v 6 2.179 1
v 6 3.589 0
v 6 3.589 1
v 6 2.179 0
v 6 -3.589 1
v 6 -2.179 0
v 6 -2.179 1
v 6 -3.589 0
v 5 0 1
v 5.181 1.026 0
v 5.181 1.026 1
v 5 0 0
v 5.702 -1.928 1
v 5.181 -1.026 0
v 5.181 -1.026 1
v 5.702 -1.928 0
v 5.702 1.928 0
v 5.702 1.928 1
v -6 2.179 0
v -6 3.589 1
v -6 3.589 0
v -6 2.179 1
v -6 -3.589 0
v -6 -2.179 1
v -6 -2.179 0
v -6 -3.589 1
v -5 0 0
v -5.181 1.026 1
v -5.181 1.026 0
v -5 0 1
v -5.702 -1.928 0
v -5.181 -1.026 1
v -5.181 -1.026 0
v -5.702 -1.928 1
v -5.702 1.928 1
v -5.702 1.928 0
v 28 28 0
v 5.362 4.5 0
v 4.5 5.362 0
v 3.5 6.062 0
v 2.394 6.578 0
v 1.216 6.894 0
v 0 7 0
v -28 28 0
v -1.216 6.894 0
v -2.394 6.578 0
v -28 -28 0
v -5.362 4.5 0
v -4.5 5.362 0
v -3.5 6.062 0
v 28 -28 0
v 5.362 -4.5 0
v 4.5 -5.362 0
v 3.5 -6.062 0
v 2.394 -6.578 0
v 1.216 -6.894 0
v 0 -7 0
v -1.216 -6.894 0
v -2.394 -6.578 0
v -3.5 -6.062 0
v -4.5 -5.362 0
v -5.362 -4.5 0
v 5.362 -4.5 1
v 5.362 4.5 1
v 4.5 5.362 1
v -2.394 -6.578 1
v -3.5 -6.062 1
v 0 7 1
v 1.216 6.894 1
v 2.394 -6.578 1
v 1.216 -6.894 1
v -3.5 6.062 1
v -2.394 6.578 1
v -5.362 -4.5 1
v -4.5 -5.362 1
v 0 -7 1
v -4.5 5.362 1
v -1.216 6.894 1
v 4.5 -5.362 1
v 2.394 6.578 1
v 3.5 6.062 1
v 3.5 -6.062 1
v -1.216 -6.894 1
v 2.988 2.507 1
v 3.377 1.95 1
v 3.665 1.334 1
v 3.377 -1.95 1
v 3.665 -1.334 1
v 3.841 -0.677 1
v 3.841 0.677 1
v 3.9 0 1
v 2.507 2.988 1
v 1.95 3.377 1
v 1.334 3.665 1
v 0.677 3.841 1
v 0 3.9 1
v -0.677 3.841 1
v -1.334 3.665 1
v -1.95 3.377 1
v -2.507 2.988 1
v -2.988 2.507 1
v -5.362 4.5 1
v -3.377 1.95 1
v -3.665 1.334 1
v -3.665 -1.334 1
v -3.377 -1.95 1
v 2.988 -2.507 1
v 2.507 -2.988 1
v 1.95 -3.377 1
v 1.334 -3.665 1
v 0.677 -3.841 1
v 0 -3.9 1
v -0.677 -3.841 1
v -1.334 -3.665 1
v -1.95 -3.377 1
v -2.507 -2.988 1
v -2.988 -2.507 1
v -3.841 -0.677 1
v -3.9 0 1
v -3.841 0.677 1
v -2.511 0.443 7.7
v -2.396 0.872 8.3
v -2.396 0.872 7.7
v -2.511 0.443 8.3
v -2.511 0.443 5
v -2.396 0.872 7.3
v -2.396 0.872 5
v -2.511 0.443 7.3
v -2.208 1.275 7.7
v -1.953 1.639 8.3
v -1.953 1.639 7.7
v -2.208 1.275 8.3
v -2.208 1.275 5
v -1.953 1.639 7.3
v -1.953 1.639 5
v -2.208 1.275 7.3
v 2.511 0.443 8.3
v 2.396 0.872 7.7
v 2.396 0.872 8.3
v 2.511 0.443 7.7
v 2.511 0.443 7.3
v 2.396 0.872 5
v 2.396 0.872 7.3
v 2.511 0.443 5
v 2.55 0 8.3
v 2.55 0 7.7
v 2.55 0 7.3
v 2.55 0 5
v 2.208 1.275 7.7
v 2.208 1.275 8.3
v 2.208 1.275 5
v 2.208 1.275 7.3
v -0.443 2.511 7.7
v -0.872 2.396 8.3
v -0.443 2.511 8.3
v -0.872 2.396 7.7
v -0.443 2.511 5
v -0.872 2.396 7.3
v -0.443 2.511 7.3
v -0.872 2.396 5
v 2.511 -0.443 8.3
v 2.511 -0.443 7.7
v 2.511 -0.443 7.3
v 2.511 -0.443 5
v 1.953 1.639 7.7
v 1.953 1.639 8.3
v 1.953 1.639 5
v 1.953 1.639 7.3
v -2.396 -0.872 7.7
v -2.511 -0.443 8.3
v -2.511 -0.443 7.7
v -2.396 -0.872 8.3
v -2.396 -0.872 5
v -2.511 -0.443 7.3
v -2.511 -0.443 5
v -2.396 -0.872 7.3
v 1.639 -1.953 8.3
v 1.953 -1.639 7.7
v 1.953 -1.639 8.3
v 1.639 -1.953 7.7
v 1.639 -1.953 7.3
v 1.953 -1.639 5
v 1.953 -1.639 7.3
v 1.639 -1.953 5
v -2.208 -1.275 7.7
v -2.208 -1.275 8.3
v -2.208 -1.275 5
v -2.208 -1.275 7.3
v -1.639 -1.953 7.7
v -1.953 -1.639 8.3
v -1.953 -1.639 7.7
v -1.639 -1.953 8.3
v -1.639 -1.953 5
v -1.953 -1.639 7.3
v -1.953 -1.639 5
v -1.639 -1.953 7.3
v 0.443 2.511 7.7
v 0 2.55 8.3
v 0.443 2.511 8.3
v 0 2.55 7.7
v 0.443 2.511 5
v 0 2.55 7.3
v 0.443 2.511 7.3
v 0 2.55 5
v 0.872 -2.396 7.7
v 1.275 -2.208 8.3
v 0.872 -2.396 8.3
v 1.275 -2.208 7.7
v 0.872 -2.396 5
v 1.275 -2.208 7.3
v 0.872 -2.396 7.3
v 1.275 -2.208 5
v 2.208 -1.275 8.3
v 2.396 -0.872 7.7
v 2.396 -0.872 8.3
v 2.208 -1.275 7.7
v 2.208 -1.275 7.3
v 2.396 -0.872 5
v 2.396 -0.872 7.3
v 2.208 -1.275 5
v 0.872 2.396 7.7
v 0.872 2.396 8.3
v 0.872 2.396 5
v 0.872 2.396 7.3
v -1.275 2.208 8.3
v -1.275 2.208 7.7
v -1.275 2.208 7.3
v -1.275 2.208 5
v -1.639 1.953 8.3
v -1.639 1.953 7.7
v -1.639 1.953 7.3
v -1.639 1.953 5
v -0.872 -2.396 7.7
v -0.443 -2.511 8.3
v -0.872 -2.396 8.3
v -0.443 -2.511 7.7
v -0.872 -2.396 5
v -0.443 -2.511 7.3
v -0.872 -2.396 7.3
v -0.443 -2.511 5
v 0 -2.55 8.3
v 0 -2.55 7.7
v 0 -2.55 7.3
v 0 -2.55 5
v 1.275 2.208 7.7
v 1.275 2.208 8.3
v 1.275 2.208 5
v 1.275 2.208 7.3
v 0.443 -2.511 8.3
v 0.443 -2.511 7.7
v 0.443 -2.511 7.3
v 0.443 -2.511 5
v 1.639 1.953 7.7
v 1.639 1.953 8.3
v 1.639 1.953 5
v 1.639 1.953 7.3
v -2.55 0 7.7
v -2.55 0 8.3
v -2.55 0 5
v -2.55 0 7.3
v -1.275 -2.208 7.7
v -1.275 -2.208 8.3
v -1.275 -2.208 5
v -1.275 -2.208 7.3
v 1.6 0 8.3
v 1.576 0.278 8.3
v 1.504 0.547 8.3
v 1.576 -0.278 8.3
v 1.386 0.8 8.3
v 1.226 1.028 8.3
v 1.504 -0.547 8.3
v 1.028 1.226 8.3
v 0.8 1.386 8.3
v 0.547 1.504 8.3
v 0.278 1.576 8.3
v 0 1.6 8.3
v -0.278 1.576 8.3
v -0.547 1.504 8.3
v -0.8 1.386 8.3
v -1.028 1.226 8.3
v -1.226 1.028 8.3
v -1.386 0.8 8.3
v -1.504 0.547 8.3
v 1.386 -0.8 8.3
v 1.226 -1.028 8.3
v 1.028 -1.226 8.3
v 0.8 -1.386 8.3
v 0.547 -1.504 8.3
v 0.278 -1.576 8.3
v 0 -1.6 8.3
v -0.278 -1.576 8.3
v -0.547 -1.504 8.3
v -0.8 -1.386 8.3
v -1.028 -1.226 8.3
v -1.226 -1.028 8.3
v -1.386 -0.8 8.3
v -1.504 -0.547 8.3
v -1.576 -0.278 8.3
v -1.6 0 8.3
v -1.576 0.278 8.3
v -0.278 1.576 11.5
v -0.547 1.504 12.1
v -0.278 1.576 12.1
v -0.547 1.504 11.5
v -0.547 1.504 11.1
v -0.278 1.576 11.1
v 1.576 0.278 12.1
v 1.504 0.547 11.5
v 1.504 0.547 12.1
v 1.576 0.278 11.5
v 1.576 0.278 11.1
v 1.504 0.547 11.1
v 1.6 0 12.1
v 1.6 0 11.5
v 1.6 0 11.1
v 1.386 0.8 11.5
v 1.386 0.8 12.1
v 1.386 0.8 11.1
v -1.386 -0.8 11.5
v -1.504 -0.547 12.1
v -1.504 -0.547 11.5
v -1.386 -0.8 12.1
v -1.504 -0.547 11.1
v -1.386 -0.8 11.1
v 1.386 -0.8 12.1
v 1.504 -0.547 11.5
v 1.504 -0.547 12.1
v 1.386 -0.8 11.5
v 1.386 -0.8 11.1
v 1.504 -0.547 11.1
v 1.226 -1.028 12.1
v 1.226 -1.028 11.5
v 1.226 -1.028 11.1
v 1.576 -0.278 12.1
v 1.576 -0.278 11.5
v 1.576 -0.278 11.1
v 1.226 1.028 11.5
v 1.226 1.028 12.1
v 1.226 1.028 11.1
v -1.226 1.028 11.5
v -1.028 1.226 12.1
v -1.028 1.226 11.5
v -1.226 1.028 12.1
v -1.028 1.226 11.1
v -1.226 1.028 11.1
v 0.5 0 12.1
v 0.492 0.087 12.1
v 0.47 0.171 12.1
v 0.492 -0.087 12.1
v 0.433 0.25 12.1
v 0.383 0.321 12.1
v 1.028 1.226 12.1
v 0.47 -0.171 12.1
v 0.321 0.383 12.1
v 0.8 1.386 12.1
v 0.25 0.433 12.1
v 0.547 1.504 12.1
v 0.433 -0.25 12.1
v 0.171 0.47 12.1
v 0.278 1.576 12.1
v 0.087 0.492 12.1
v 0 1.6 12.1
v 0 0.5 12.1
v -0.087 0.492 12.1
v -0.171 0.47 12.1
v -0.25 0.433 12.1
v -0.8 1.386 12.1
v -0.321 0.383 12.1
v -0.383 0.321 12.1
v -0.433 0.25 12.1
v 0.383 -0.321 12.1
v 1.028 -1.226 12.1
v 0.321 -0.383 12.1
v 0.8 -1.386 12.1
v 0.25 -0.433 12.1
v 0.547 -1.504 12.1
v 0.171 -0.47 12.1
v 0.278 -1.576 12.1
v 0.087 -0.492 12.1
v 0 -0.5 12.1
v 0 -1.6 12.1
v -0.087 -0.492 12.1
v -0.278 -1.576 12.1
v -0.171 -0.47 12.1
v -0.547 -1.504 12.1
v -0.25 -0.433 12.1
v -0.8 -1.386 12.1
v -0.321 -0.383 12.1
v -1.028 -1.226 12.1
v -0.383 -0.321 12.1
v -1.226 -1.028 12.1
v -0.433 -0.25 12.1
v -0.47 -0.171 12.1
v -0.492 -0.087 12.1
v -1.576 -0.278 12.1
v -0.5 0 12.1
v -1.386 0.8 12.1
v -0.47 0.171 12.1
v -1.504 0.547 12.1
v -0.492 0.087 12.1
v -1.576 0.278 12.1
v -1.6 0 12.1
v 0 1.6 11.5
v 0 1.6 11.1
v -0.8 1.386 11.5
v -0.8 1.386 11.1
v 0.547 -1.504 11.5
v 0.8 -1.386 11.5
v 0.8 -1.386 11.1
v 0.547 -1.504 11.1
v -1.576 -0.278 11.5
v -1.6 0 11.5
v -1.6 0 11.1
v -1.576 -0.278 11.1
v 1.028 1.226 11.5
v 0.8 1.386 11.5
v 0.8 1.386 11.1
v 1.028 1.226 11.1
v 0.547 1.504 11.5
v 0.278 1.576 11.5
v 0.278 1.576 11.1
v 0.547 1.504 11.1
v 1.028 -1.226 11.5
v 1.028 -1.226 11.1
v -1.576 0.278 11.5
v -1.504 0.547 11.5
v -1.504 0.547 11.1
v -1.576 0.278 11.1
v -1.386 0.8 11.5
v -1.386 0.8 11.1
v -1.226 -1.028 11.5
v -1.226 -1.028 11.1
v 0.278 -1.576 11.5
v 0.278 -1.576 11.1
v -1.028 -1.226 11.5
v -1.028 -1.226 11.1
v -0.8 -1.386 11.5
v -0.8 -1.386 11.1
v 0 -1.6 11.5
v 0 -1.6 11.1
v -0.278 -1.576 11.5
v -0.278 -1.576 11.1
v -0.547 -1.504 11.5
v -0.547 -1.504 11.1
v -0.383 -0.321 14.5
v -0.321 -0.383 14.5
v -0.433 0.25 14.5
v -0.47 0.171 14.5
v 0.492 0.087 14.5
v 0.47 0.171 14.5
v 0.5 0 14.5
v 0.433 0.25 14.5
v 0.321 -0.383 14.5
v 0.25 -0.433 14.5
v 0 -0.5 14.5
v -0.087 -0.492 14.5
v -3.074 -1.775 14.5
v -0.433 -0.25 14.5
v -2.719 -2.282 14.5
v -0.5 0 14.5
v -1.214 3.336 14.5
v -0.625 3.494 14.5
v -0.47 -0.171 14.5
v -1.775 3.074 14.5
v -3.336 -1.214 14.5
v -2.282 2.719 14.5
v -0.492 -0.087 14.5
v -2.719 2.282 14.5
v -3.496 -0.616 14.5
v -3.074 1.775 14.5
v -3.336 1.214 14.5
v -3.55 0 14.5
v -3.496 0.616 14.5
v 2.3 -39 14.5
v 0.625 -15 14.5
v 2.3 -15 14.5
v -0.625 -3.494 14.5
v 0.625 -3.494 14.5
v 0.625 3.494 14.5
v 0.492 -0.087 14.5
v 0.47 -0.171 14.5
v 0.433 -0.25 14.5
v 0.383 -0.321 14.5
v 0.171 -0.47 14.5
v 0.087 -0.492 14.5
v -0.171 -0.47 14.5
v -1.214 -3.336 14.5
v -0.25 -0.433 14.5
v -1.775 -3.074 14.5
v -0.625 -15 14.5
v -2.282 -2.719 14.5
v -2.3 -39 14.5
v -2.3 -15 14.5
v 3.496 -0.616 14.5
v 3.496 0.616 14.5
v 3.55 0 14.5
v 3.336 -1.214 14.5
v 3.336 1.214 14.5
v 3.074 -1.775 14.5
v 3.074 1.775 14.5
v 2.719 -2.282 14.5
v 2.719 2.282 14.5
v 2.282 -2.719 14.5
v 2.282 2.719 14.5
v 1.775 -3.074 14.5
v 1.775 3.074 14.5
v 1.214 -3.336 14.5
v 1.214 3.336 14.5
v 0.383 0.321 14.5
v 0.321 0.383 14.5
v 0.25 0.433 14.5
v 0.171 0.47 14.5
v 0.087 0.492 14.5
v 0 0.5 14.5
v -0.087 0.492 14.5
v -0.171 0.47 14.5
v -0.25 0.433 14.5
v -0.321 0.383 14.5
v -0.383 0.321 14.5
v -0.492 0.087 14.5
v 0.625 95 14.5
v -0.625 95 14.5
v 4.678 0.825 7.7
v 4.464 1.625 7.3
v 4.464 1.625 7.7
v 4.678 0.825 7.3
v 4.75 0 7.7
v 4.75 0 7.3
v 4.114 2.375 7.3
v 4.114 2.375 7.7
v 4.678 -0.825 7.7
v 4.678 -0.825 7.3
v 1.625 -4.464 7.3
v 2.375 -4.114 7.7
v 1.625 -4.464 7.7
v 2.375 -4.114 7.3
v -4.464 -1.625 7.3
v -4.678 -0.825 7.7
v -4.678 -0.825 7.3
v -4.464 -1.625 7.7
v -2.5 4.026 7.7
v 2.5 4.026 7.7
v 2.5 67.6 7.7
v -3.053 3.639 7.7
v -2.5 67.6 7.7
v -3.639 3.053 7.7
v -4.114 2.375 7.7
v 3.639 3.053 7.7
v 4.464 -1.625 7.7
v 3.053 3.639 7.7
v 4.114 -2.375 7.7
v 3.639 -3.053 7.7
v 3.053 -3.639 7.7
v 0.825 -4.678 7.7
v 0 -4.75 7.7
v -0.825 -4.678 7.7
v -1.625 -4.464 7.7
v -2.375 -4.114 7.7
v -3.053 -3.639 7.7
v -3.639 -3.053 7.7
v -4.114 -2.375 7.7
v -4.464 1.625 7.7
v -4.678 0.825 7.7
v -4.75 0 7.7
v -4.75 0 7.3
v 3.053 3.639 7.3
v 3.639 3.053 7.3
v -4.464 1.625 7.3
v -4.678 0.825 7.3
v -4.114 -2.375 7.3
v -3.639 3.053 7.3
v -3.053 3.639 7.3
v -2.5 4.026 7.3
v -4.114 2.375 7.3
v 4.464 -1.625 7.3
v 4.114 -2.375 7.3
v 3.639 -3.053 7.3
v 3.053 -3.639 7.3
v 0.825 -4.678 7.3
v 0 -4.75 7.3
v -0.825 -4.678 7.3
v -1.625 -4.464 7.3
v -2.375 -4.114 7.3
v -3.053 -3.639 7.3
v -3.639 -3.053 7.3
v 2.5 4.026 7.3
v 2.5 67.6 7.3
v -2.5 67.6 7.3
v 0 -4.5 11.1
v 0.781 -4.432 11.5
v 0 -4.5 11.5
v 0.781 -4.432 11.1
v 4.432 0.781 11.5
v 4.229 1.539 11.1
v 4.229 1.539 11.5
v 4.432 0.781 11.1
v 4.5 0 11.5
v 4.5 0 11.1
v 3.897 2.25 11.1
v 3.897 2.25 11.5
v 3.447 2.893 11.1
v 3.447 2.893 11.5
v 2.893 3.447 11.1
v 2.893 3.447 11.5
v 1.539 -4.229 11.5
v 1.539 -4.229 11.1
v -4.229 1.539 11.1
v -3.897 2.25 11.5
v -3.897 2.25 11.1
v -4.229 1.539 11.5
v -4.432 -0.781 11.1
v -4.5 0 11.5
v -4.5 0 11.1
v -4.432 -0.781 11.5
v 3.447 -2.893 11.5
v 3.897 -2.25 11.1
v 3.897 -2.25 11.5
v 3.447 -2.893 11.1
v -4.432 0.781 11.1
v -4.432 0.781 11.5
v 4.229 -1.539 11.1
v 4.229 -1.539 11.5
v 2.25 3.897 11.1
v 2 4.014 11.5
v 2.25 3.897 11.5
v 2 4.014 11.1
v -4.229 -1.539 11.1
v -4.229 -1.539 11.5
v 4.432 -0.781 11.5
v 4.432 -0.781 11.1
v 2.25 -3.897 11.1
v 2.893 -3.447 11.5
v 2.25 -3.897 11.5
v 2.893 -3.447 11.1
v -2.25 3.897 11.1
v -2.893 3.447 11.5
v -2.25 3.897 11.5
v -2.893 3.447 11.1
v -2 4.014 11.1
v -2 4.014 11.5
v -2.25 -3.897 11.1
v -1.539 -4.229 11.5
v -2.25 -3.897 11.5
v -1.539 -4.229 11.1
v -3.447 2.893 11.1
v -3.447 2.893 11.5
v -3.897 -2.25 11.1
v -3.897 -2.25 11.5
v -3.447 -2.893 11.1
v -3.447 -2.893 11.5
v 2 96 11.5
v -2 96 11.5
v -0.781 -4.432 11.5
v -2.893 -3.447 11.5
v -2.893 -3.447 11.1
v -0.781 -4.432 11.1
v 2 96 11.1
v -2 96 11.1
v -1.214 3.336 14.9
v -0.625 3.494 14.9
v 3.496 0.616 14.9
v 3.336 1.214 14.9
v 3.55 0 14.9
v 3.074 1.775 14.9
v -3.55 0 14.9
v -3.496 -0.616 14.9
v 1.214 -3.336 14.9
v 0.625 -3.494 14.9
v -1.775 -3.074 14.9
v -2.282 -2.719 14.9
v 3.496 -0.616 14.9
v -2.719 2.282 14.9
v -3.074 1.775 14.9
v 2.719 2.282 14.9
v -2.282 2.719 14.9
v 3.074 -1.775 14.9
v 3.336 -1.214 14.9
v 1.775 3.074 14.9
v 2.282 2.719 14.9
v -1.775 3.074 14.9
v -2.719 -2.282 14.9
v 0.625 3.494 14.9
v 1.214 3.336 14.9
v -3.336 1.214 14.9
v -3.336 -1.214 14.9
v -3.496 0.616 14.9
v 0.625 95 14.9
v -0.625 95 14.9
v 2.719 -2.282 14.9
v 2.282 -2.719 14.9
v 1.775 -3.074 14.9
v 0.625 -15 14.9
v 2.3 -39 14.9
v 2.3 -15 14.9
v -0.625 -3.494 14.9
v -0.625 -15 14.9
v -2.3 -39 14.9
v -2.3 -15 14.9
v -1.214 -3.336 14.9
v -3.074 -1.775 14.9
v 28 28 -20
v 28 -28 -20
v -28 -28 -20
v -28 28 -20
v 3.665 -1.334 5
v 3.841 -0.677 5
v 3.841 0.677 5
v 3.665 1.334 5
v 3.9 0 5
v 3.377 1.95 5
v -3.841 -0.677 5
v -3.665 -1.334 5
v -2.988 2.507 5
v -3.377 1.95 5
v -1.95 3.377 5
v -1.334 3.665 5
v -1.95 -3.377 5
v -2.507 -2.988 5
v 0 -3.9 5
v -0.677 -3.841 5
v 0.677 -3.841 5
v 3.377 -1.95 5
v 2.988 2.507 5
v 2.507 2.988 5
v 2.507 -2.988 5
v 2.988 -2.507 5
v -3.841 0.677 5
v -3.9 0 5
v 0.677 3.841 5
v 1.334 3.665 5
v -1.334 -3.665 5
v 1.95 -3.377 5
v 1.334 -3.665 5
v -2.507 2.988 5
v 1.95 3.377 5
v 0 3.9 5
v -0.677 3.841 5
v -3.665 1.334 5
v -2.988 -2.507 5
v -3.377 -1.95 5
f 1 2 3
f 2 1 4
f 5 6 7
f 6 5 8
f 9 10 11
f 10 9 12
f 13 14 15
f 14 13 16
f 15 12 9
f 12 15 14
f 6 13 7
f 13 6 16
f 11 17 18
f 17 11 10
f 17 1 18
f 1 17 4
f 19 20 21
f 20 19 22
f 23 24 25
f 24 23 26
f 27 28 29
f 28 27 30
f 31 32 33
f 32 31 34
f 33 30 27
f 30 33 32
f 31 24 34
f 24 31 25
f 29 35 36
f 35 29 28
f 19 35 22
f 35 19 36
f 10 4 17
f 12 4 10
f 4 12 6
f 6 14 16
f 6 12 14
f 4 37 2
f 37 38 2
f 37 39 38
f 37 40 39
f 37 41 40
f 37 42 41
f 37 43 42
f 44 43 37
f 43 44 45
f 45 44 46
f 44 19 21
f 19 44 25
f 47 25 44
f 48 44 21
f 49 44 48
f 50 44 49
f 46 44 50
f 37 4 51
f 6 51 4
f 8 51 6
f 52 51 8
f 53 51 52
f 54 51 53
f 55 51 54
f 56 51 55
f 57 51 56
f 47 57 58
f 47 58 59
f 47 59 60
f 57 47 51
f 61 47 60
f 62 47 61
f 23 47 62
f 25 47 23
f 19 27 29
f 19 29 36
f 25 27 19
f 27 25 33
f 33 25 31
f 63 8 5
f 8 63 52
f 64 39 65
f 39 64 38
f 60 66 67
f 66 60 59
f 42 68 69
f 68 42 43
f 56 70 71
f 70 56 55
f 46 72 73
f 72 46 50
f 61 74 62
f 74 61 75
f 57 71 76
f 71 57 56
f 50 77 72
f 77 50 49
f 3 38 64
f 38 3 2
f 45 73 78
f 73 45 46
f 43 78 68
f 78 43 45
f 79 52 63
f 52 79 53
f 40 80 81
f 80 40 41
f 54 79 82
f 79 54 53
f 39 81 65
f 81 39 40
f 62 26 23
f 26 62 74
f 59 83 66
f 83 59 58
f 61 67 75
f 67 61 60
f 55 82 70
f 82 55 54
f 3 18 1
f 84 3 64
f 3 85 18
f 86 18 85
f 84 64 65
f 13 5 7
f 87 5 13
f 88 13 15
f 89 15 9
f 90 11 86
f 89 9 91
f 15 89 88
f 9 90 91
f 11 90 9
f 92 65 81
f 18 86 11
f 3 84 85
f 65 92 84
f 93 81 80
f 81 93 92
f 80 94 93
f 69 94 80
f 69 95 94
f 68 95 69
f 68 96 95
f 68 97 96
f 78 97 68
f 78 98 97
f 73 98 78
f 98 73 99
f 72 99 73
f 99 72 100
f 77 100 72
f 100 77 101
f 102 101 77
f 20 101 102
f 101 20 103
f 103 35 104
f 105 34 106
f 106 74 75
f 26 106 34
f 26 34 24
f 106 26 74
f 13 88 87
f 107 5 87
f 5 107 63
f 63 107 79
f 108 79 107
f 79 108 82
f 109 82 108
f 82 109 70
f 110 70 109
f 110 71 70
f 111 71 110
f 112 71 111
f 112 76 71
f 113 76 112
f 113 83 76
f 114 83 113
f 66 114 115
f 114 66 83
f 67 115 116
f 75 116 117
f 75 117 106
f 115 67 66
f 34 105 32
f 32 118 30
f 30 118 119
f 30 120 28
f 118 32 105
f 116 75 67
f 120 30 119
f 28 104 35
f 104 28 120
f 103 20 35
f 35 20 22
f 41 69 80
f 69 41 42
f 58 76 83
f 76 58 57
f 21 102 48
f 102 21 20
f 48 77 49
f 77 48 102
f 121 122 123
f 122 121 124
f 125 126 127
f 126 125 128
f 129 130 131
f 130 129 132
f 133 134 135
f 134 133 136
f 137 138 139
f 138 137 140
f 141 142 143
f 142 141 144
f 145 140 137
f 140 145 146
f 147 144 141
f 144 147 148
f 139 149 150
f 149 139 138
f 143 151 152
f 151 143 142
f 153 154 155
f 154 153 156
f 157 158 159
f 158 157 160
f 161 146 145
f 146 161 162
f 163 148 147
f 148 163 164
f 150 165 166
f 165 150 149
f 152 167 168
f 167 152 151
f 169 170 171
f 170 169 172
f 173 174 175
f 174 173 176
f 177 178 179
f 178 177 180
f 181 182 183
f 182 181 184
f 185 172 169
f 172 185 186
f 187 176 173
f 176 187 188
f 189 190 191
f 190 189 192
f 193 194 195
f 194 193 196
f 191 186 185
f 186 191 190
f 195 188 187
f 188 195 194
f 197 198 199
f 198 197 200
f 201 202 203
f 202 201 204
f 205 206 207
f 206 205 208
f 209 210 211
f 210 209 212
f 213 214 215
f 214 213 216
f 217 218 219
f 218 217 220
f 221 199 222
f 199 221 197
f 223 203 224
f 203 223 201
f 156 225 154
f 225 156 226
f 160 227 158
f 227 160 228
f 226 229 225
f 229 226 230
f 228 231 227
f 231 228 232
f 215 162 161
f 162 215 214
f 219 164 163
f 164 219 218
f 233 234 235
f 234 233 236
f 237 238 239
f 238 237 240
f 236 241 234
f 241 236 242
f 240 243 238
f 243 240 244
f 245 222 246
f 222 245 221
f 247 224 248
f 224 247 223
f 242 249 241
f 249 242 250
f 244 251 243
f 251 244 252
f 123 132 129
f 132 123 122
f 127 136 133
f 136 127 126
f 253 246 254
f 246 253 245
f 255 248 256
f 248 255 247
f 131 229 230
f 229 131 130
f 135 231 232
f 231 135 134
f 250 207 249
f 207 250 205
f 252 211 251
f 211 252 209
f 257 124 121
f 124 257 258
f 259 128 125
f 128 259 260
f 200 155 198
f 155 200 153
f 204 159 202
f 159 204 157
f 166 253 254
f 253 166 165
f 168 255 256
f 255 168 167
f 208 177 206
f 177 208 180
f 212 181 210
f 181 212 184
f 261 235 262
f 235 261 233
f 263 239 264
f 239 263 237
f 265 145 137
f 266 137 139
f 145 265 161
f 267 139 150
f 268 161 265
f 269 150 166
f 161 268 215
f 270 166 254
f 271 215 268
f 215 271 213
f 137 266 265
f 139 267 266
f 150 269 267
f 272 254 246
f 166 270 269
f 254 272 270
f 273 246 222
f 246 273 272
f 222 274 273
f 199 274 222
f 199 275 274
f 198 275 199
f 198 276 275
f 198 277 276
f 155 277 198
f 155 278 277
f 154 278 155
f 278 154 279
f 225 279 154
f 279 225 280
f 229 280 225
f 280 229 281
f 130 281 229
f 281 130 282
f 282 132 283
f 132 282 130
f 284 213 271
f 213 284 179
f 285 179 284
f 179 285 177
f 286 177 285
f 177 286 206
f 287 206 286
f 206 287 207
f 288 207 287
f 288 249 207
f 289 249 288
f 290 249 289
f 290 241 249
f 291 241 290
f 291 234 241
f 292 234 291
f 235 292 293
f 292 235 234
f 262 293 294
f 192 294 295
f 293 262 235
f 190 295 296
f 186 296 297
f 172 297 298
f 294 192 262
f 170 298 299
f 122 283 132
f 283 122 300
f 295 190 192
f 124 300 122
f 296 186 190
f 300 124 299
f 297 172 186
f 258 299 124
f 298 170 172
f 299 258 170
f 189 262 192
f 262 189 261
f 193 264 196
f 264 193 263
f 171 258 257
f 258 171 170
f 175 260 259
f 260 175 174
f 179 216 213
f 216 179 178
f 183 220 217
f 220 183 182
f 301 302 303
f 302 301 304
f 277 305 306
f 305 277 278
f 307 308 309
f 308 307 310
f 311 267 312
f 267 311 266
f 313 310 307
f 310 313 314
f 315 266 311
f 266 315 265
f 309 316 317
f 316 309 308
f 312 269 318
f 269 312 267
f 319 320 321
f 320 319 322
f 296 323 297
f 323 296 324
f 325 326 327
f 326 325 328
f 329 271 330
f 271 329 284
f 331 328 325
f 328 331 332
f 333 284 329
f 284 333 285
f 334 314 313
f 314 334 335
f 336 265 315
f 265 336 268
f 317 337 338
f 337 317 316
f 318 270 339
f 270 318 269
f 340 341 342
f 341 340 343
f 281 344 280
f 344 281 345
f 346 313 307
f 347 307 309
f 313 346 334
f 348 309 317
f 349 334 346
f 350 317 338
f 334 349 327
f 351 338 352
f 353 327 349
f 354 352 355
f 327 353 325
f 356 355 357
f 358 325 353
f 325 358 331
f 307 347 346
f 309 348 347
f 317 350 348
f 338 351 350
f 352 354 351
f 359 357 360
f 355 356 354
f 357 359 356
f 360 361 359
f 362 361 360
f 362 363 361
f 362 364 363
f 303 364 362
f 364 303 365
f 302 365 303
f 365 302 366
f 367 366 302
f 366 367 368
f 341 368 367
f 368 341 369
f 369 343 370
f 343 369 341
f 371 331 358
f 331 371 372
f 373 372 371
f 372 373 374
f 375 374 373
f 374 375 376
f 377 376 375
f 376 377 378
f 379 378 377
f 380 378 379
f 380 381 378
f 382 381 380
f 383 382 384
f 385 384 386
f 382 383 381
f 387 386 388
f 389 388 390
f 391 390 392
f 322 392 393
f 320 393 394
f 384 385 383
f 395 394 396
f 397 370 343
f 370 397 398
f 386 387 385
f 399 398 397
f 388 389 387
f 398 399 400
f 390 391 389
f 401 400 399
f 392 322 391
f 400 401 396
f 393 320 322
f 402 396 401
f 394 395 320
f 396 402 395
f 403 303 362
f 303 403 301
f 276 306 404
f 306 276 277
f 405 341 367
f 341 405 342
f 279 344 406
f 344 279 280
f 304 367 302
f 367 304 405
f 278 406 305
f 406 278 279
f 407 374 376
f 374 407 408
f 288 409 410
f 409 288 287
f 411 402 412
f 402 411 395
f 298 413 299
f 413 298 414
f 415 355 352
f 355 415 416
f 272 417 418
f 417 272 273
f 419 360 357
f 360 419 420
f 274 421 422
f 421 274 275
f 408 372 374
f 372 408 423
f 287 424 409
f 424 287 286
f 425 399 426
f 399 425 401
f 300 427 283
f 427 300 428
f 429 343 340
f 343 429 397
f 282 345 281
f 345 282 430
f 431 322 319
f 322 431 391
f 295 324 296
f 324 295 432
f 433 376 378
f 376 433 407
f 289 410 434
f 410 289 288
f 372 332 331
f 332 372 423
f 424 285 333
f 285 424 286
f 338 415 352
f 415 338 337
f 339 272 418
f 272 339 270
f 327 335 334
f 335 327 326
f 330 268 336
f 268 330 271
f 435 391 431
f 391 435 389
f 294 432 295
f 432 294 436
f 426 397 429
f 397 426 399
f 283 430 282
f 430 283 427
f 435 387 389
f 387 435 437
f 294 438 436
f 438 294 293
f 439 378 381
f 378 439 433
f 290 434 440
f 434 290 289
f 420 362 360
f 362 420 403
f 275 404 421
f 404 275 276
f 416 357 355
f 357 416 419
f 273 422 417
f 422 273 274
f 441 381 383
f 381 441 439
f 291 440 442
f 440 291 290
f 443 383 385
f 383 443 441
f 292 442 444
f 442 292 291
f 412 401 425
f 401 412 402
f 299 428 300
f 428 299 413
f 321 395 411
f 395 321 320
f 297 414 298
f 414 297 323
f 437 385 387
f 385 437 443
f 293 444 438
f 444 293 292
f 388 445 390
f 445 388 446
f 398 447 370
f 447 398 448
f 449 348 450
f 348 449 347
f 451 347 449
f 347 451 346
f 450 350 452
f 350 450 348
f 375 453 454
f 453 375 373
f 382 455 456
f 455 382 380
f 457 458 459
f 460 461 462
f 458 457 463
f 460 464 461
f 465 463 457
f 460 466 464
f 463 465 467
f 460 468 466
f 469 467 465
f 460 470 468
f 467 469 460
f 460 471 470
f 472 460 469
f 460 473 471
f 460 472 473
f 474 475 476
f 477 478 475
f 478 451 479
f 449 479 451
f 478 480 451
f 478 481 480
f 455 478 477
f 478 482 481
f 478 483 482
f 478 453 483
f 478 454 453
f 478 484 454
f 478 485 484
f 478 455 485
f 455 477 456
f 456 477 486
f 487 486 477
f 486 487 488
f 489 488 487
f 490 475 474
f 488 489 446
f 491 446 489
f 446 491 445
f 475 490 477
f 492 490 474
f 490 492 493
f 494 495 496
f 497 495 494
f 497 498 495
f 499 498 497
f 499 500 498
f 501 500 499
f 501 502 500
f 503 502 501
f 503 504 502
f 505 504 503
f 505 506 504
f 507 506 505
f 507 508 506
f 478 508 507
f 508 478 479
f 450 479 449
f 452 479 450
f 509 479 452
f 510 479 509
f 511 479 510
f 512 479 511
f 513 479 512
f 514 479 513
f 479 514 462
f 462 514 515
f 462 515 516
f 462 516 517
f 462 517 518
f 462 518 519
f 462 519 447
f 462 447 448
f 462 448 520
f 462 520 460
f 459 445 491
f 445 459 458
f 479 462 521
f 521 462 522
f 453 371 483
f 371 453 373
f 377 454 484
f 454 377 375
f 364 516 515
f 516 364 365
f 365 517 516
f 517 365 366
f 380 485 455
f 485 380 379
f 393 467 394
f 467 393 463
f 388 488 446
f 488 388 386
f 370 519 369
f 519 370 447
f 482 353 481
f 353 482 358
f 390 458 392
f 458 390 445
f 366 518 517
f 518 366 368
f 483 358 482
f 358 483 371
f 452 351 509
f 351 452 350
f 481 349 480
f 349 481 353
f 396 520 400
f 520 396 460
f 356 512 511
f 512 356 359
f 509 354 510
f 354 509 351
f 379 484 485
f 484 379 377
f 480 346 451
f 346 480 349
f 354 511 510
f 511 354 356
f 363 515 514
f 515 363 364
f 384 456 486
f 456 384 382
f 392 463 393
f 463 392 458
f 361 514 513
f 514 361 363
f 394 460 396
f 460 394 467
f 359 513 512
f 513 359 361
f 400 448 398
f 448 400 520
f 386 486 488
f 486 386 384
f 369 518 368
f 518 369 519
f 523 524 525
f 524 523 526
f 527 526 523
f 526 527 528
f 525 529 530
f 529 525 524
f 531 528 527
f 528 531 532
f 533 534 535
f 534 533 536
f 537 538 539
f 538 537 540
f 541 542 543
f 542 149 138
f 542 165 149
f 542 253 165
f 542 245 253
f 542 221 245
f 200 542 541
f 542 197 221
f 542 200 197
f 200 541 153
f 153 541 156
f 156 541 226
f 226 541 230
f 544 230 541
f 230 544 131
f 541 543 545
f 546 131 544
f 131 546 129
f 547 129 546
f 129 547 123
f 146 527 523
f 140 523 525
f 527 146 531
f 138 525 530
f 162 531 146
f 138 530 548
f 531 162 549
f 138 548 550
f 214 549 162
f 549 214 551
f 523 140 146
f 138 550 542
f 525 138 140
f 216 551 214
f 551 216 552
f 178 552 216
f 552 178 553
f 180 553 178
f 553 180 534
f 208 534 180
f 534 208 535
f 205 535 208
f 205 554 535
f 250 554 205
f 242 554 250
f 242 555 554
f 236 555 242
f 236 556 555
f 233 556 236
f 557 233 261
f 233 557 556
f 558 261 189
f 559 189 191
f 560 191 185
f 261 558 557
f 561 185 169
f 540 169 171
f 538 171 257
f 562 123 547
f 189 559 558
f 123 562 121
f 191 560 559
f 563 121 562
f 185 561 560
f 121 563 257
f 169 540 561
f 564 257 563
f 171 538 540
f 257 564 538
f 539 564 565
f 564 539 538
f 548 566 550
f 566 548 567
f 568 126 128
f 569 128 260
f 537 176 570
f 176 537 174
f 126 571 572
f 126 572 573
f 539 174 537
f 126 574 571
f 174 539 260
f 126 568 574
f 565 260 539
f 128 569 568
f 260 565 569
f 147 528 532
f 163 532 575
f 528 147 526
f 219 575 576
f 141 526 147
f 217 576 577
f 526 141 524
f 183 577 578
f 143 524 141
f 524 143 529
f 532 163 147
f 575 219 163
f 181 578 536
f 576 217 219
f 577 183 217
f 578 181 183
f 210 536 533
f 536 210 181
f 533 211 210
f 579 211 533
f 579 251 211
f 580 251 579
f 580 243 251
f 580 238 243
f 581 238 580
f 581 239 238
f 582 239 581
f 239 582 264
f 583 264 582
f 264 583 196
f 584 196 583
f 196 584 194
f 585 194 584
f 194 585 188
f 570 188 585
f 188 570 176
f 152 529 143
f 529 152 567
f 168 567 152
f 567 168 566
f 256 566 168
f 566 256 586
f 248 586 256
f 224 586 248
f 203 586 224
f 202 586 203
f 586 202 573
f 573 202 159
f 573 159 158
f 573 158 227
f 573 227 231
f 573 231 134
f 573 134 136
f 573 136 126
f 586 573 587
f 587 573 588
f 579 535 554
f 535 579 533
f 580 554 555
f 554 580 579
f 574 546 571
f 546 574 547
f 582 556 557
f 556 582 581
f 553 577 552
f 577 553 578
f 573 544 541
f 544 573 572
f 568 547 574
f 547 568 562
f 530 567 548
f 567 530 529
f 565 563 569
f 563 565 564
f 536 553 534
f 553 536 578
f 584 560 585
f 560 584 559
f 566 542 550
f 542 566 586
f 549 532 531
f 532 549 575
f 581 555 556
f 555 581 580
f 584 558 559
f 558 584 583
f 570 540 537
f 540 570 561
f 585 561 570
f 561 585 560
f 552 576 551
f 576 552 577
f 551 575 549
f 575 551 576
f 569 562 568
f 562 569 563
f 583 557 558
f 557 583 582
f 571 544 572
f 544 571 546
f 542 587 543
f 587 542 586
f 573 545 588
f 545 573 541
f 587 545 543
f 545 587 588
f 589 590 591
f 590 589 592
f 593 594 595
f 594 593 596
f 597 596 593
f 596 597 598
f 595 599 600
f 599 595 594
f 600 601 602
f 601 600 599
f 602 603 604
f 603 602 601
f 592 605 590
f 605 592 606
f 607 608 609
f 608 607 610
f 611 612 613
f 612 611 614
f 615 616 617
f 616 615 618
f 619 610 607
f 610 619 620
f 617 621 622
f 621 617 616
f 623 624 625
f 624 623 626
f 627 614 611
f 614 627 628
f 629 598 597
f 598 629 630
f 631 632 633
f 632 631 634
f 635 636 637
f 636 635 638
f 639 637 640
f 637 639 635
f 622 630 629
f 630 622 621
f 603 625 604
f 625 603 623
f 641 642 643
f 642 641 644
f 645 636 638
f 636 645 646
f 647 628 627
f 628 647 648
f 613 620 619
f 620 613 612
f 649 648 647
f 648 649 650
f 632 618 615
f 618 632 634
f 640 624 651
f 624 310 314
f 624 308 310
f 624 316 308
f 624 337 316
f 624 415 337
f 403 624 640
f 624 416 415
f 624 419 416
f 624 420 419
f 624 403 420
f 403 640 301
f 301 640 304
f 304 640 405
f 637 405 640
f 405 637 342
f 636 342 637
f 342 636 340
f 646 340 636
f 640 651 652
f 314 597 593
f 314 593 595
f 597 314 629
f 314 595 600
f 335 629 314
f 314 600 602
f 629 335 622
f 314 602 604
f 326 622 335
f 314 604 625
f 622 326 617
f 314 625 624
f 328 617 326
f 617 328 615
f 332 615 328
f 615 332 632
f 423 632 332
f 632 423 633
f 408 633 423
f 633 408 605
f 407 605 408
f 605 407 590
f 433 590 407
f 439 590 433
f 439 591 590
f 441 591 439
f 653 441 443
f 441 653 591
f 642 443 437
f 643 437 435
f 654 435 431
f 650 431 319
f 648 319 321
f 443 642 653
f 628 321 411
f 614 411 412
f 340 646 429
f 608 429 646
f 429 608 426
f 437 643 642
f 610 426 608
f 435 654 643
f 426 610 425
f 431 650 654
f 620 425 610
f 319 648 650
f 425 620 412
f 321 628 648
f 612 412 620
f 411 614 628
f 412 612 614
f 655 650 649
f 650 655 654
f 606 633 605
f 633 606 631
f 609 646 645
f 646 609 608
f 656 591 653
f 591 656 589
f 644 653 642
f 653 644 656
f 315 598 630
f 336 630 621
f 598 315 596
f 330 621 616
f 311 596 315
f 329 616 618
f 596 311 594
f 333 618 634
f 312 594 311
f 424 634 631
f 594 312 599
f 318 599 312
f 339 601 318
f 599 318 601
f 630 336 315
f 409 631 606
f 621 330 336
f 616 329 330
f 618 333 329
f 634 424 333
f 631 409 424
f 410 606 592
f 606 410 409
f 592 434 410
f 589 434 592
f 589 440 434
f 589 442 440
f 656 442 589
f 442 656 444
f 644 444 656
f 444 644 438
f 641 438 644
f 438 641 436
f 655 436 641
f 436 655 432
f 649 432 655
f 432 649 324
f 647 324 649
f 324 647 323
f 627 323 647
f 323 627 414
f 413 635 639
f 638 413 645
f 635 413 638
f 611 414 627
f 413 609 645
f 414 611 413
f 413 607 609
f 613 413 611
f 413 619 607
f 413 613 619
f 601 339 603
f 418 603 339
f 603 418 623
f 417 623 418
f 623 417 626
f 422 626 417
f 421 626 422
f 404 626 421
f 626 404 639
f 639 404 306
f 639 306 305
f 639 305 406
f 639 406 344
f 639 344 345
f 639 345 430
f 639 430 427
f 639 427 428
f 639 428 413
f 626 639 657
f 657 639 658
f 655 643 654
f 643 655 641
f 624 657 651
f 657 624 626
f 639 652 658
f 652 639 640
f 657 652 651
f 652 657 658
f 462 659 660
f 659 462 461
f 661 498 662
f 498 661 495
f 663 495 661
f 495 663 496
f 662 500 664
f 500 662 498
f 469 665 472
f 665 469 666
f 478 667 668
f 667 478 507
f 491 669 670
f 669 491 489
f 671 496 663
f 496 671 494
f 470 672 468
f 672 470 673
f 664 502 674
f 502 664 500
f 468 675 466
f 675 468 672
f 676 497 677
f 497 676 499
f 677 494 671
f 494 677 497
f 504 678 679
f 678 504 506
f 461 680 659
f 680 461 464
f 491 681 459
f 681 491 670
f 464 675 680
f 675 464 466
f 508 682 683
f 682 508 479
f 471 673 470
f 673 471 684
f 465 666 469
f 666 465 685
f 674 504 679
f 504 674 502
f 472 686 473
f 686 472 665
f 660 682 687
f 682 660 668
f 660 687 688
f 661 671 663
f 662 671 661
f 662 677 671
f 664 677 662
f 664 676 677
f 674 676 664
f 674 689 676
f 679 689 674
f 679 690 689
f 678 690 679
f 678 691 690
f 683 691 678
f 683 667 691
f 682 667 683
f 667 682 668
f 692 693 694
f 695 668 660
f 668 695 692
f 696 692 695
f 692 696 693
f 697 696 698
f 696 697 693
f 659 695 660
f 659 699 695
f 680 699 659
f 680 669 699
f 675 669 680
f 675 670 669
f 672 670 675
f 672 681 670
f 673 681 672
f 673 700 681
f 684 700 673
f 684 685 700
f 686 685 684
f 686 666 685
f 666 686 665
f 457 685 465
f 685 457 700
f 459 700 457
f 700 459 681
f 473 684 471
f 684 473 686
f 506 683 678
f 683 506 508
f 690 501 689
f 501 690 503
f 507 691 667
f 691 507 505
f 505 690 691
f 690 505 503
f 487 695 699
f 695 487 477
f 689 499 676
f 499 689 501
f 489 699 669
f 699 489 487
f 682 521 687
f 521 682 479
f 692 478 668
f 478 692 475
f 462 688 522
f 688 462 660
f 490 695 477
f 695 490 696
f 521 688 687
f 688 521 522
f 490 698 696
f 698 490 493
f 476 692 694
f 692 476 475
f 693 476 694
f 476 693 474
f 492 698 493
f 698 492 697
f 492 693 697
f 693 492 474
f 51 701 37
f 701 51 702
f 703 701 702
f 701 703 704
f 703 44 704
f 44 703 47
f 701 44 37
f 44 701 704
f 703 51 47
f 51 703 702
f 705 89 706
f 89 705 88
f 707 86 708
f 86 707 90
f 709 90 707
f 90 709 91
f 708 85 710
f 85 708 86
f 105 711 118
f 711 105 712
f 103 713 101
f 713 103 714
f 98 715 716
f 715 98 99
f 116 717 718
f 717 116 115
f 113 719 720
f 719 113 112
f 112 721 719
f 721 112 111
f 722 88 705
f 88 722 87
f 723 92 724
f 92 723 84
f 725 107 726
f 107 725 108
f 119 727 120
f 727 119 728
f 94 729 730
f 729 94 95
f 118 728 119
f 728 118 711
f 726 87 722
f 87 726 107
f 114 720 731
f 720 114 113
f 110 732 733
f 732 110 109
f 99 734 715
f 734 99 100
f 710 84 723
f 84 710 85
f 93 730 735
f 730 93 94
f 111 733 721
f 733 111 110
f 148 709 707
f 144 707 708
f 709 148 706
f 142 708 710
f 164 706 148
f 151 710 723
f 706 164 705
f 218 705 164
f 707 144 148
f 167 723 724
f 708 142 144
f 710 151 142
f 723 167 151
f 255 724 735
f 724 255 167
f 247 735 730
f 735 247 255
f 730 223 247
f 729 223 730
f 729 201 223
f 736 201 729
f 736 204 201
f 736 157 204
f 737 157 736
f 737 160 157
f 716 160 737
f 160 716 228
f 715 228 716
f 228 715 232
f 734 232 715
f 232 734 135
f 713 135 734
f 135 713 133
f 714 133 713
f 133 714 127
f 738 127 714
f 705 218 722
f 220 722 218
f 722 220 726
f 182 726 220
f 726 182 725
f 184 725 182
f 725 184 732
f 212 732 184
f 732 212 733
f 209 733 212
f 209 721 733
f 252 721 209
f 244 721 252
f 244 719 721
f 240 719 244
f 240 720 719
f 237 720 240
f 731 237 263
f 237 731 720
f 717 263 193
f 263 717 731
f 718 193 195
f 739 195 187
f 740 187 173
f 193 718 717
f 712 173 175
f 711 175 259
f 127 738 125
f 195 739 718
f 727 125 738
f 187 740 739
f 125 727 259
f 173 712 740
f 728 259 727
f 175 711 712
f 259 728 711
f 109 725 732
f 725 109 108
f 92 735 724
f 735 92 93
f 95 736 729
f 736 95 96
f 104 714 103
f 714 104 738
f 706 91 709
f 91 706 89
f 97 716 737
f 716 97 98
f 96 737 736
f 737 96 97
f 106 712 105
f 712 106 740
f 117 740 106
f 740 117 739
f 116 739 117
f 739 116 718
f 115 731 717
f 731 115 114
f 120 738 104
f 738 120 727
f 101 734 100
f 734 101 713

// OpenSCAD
module clock_movement( time = [4, 39, 15], hand_style = "deco") {
    
        // clock_movement constants
    movement_data = [
        ["width",  56], // width of the main body
        ["depth",  56], // depth of the main body
        ["height", 20], // height of the main body

        ["alignment_dm",       14], // alignment diameter
        ["alignment_h",         1], // alignment height
        ["alignment_flat",      1], // alignment flattening
        ["alignment_notch_dm",  6], // alignment notch diameter
        ["alignment_notch_fl",  2], // alignment notch flattening
        
        ["screw_terminal_dm", 7.8], // screw terminal diameter
        ["screw_terminal_h",  5  ], // screw terminal height
                                   // measured from main body
        
        ["hour_axle_dm", 5.1], // hour axle diameter
        ["hour_axle_h",  8.3], // hour axle height
        
        ["minute_axle_dm",  3.2], // minute axle diameter
        ["minute_axle_h",  12.1], // minute axle height

        ["second_axle_dm",  1  ], // second axle diameter
        ["second_axle_h",  14.5]  // second axle height
    ];

    function movement_dim( name ) = 
        [ for (d = movement_data) if (d[0] == name) d[1] ][0];
    
    width  = movement_dim("width");
    depth  = movement_dim("depth");
    height = movement_dim("height");
       
    alignment_dm       = movement_dim("alignment_dm");
    alignment_h        = movement_dim("alignment_h");
    alignment_flat     = movement_dim("alignment_flat");
    alignment_notch_dm = movement_dim("alignment_notch_dm");
    alignment_notch_fl = movement_dim("alignment_notch_fl");
    
    screw_terminal_dm = movement_dim("screw_terminal_dm");
    screw_terminal_h  = movement_dim("screw_terminal_h");
    
    hour_axle_dm = movement_dim("hour_axle_dm");
    hour_axle_h  = movement_dim("hour_axle_h");
    
    minute_axle_dm = movement_dim("minute_axle_dm");
    minute_axle_h  = movement_dim("minute_axle_h");

    second_axle_dm = movement_dim("second_axle_dm");
    second_axle_h  = movement_dim("second_axle_h");
        

    
    // hand_style constants
    hands_data = [
        ["style",    "modern", "classic", "deco"],

        ["hour_l",      72.35,        61,   62.9],
        ["hour_r",       67.6,      56.6,  58.65],
        ["hour_w",          5,       1.5,      2],
        ["hour_h",        0.4,       0.4,    0.4],

        ["minute_l",    100.5,        84,  101.5],
        ["minute_r",       96,      79.5,  74.62],
        ["minute_w",        4,         1,      1],
        ["minute_h",      0.4,       0.4,    0.4],

        ["second_l",      134,       123,    120],
        ["second_r",       95,      88.4,  85.66],
        ["second_w",     1.25,       0.6,    0.7],
        ["second_h",      0.4,       0.4,    0.4]
    ];

    function hands_dim( name, stil ) = 
        let ( 
            row = search( [name], hands_data)[0],
            col = search( [stil], hands_data[0])[0]
        ) hands_data[row][col];
    
    // main body
    color("Gray")
    // method 1 as of in the book
    translate( [-width / 2, -depth / 2 , -height ] )
    cube( [width, depth, height] ); 
    // method 2
    //    translate( [0, 0, -height/2] )
    //   # cube( [width, depth, height], center = true ); 

    
    // alignment pattern
     difference() {
        
        color("DarkBlue")
        cylinder( d = alignment_dm, h = alignment_h, $fn = 36);
        
        color("Gray")
        for ( i = [0:1] )
        mirror( [i, 0, 0] )
        union() {
            translate([ alignment_dm / 2 - alignment_flat, -(alignment_dm + 2) / 2, -1 ])
            cube([alignment_flat + 1, alignment_dm + 2, alignment_h + 2 ]);
            
            translate([ alignment_dm / 2 - alignment_notch_fl + alignment_notch_dm / 2, 0, -1 ])
            cylinder( d = alignment_notch_dm, h = alignment_h +2, $fn = 18);
        }
    }
    
    // screw terminal
    color("Gold")
    cylinder( d = screw_terminal_dm, h = screw_terminal_h, $fn = 36);
    
    // axles
    color("Black") {
        cylinder( d = hour_axle_dm, h = hour_axle_h, $fn = 36);
        cylinder( d = minute_axle_dm, h = minute_axle_h, $fn = 36);
        cylinder( d = second_axle_dm, h = second_axle_h, $fn = 36);
    }
    
    // clock hands
    rotate( [0, 0, -360 *  time[0] / 12] )
    translate( [0, 0, hour_axle_h - 1] )
    hour_hand();
    
    rotate( [0, 0, -360 * time[1] / 60] )
    translate( [0, 0, minute_axle_h - 1] )
    minute_hand();
    
    rotate( [0, 0, -360 * time[2] / 60] )
    translate( [0, 0, second_axle_h ] )
    second_hand();
    
    module hour_hand()  // German: stundenzeiger
    {
        h = hands_dim("hour_h",hand_style);
        l = hands_dim("hour_l",hand_style);
        r = hands_dim("hour_r",hand_style);
        b = hands_dim("hour_w",hand_style);
        
        dm = 9.5;  // diameter
        
        if (hand_style == "modern") {
            color("Black")
            union() {
                cylinder( d = dm, h = h, $fn = 36);
                
                translate( [ -b / 2,  0, 0 ] )
                    cube ( [ b, r, h] );
                }
            }
            
        if (hand_style == "deco") {
            color("black")
            linear_extrude( height = h )
            import("hour.svg");
            }
        
        if (hand_style == "classic") {
            lc = 61;
            color("black")
            png_hands( "hour.png", lc, h, [-9.5, -6.75, 0]);
            }
            
        }
    
    module minute_hand()    // German: minute hand
        {
        
        h = hands_dim("minute_h",hand_style);
        l = hands_dim("minute_l",hand_style);
        r = hands_dim("minute_r",hand_style);
        b = hands_dim("minute_w",hand_style);
        dm = 9;     // diameter
        
        if (hand_style == "modern") {
            color("Black")
            union() {
                cylinder( d = dm, h = h, $fn = 36 );
                
                translate( [-b / 2, 0, 0] )
                cube( [b, r, h] );
            }
        }
        
        if (hand_style == "deco") {
            color("black")
            linear_extrude( height = h )
            import("minute.svg");
            }
            
        if (hand_style == "classic") {
            lc = 84;

            color("Black")
            png_hands("minute.png", lc, h, [-9, -6.75, 0]);
        }
    }
    
    module second_hand()    // German: sekundenzeiger
    {
        
        b1  = 1.25; // width front part
        l1  = 95;   // length front part
        b2  = 1.25; // width neck
        l2  = 15;   // length neck
        b3  = 4.6;  // width back part
        l3  = 24;   // length back part
        dm  = 7.1;  // diameter
        h = hands_dim("second_h",hand_style);
        l = hands_dim("second_l",hand_style);
        r = hands_dim("second_r",hand_style);
        b = hands_dim("second_w",hand_style);
        
        if (hand_style == "modern") {
            color("Red")
            union() {
                cylinder( d = dm, h = h, $fn = 36);
                
                translate( [-b1 / 2, 0, 0] )
                cube( [b1, l1, h] );
                
                translate( [-b2 / 2, -l2, 0] )
                cube( [b2, l2, h] );

                translate( [-b3 / 2, -(l2 + l3), 0] )
                cube( [b3, l3, h] );
            }
        }
        
        if (hand_style == "deco") {
            color("red")        // project file is still "black"
            linear_extrude( height = h )
            import("second.svg");
            }
        
        if (hand_style == "classic") {
            lc = 123;

            color("Black")
            png_hands("second.png", lc, h, [-4,-36.8,0] );
        }
       
        }
        
        module png_hands(filename, length, height, displacement) {
            translate( displacement )
            linear_extrude( height = height )
            resize( [0, length], auto = true )
            projection( cut = true )
            translate( [0, 0, 75])
            surface( filename, invert=true);
            }
    
    }
 
function get_time (tick) = [ (tick / 3600) % 12, (tick / 60 ) % 60, tick % 60];
 
clock_movement( get_time($t * 43200), "modern");
